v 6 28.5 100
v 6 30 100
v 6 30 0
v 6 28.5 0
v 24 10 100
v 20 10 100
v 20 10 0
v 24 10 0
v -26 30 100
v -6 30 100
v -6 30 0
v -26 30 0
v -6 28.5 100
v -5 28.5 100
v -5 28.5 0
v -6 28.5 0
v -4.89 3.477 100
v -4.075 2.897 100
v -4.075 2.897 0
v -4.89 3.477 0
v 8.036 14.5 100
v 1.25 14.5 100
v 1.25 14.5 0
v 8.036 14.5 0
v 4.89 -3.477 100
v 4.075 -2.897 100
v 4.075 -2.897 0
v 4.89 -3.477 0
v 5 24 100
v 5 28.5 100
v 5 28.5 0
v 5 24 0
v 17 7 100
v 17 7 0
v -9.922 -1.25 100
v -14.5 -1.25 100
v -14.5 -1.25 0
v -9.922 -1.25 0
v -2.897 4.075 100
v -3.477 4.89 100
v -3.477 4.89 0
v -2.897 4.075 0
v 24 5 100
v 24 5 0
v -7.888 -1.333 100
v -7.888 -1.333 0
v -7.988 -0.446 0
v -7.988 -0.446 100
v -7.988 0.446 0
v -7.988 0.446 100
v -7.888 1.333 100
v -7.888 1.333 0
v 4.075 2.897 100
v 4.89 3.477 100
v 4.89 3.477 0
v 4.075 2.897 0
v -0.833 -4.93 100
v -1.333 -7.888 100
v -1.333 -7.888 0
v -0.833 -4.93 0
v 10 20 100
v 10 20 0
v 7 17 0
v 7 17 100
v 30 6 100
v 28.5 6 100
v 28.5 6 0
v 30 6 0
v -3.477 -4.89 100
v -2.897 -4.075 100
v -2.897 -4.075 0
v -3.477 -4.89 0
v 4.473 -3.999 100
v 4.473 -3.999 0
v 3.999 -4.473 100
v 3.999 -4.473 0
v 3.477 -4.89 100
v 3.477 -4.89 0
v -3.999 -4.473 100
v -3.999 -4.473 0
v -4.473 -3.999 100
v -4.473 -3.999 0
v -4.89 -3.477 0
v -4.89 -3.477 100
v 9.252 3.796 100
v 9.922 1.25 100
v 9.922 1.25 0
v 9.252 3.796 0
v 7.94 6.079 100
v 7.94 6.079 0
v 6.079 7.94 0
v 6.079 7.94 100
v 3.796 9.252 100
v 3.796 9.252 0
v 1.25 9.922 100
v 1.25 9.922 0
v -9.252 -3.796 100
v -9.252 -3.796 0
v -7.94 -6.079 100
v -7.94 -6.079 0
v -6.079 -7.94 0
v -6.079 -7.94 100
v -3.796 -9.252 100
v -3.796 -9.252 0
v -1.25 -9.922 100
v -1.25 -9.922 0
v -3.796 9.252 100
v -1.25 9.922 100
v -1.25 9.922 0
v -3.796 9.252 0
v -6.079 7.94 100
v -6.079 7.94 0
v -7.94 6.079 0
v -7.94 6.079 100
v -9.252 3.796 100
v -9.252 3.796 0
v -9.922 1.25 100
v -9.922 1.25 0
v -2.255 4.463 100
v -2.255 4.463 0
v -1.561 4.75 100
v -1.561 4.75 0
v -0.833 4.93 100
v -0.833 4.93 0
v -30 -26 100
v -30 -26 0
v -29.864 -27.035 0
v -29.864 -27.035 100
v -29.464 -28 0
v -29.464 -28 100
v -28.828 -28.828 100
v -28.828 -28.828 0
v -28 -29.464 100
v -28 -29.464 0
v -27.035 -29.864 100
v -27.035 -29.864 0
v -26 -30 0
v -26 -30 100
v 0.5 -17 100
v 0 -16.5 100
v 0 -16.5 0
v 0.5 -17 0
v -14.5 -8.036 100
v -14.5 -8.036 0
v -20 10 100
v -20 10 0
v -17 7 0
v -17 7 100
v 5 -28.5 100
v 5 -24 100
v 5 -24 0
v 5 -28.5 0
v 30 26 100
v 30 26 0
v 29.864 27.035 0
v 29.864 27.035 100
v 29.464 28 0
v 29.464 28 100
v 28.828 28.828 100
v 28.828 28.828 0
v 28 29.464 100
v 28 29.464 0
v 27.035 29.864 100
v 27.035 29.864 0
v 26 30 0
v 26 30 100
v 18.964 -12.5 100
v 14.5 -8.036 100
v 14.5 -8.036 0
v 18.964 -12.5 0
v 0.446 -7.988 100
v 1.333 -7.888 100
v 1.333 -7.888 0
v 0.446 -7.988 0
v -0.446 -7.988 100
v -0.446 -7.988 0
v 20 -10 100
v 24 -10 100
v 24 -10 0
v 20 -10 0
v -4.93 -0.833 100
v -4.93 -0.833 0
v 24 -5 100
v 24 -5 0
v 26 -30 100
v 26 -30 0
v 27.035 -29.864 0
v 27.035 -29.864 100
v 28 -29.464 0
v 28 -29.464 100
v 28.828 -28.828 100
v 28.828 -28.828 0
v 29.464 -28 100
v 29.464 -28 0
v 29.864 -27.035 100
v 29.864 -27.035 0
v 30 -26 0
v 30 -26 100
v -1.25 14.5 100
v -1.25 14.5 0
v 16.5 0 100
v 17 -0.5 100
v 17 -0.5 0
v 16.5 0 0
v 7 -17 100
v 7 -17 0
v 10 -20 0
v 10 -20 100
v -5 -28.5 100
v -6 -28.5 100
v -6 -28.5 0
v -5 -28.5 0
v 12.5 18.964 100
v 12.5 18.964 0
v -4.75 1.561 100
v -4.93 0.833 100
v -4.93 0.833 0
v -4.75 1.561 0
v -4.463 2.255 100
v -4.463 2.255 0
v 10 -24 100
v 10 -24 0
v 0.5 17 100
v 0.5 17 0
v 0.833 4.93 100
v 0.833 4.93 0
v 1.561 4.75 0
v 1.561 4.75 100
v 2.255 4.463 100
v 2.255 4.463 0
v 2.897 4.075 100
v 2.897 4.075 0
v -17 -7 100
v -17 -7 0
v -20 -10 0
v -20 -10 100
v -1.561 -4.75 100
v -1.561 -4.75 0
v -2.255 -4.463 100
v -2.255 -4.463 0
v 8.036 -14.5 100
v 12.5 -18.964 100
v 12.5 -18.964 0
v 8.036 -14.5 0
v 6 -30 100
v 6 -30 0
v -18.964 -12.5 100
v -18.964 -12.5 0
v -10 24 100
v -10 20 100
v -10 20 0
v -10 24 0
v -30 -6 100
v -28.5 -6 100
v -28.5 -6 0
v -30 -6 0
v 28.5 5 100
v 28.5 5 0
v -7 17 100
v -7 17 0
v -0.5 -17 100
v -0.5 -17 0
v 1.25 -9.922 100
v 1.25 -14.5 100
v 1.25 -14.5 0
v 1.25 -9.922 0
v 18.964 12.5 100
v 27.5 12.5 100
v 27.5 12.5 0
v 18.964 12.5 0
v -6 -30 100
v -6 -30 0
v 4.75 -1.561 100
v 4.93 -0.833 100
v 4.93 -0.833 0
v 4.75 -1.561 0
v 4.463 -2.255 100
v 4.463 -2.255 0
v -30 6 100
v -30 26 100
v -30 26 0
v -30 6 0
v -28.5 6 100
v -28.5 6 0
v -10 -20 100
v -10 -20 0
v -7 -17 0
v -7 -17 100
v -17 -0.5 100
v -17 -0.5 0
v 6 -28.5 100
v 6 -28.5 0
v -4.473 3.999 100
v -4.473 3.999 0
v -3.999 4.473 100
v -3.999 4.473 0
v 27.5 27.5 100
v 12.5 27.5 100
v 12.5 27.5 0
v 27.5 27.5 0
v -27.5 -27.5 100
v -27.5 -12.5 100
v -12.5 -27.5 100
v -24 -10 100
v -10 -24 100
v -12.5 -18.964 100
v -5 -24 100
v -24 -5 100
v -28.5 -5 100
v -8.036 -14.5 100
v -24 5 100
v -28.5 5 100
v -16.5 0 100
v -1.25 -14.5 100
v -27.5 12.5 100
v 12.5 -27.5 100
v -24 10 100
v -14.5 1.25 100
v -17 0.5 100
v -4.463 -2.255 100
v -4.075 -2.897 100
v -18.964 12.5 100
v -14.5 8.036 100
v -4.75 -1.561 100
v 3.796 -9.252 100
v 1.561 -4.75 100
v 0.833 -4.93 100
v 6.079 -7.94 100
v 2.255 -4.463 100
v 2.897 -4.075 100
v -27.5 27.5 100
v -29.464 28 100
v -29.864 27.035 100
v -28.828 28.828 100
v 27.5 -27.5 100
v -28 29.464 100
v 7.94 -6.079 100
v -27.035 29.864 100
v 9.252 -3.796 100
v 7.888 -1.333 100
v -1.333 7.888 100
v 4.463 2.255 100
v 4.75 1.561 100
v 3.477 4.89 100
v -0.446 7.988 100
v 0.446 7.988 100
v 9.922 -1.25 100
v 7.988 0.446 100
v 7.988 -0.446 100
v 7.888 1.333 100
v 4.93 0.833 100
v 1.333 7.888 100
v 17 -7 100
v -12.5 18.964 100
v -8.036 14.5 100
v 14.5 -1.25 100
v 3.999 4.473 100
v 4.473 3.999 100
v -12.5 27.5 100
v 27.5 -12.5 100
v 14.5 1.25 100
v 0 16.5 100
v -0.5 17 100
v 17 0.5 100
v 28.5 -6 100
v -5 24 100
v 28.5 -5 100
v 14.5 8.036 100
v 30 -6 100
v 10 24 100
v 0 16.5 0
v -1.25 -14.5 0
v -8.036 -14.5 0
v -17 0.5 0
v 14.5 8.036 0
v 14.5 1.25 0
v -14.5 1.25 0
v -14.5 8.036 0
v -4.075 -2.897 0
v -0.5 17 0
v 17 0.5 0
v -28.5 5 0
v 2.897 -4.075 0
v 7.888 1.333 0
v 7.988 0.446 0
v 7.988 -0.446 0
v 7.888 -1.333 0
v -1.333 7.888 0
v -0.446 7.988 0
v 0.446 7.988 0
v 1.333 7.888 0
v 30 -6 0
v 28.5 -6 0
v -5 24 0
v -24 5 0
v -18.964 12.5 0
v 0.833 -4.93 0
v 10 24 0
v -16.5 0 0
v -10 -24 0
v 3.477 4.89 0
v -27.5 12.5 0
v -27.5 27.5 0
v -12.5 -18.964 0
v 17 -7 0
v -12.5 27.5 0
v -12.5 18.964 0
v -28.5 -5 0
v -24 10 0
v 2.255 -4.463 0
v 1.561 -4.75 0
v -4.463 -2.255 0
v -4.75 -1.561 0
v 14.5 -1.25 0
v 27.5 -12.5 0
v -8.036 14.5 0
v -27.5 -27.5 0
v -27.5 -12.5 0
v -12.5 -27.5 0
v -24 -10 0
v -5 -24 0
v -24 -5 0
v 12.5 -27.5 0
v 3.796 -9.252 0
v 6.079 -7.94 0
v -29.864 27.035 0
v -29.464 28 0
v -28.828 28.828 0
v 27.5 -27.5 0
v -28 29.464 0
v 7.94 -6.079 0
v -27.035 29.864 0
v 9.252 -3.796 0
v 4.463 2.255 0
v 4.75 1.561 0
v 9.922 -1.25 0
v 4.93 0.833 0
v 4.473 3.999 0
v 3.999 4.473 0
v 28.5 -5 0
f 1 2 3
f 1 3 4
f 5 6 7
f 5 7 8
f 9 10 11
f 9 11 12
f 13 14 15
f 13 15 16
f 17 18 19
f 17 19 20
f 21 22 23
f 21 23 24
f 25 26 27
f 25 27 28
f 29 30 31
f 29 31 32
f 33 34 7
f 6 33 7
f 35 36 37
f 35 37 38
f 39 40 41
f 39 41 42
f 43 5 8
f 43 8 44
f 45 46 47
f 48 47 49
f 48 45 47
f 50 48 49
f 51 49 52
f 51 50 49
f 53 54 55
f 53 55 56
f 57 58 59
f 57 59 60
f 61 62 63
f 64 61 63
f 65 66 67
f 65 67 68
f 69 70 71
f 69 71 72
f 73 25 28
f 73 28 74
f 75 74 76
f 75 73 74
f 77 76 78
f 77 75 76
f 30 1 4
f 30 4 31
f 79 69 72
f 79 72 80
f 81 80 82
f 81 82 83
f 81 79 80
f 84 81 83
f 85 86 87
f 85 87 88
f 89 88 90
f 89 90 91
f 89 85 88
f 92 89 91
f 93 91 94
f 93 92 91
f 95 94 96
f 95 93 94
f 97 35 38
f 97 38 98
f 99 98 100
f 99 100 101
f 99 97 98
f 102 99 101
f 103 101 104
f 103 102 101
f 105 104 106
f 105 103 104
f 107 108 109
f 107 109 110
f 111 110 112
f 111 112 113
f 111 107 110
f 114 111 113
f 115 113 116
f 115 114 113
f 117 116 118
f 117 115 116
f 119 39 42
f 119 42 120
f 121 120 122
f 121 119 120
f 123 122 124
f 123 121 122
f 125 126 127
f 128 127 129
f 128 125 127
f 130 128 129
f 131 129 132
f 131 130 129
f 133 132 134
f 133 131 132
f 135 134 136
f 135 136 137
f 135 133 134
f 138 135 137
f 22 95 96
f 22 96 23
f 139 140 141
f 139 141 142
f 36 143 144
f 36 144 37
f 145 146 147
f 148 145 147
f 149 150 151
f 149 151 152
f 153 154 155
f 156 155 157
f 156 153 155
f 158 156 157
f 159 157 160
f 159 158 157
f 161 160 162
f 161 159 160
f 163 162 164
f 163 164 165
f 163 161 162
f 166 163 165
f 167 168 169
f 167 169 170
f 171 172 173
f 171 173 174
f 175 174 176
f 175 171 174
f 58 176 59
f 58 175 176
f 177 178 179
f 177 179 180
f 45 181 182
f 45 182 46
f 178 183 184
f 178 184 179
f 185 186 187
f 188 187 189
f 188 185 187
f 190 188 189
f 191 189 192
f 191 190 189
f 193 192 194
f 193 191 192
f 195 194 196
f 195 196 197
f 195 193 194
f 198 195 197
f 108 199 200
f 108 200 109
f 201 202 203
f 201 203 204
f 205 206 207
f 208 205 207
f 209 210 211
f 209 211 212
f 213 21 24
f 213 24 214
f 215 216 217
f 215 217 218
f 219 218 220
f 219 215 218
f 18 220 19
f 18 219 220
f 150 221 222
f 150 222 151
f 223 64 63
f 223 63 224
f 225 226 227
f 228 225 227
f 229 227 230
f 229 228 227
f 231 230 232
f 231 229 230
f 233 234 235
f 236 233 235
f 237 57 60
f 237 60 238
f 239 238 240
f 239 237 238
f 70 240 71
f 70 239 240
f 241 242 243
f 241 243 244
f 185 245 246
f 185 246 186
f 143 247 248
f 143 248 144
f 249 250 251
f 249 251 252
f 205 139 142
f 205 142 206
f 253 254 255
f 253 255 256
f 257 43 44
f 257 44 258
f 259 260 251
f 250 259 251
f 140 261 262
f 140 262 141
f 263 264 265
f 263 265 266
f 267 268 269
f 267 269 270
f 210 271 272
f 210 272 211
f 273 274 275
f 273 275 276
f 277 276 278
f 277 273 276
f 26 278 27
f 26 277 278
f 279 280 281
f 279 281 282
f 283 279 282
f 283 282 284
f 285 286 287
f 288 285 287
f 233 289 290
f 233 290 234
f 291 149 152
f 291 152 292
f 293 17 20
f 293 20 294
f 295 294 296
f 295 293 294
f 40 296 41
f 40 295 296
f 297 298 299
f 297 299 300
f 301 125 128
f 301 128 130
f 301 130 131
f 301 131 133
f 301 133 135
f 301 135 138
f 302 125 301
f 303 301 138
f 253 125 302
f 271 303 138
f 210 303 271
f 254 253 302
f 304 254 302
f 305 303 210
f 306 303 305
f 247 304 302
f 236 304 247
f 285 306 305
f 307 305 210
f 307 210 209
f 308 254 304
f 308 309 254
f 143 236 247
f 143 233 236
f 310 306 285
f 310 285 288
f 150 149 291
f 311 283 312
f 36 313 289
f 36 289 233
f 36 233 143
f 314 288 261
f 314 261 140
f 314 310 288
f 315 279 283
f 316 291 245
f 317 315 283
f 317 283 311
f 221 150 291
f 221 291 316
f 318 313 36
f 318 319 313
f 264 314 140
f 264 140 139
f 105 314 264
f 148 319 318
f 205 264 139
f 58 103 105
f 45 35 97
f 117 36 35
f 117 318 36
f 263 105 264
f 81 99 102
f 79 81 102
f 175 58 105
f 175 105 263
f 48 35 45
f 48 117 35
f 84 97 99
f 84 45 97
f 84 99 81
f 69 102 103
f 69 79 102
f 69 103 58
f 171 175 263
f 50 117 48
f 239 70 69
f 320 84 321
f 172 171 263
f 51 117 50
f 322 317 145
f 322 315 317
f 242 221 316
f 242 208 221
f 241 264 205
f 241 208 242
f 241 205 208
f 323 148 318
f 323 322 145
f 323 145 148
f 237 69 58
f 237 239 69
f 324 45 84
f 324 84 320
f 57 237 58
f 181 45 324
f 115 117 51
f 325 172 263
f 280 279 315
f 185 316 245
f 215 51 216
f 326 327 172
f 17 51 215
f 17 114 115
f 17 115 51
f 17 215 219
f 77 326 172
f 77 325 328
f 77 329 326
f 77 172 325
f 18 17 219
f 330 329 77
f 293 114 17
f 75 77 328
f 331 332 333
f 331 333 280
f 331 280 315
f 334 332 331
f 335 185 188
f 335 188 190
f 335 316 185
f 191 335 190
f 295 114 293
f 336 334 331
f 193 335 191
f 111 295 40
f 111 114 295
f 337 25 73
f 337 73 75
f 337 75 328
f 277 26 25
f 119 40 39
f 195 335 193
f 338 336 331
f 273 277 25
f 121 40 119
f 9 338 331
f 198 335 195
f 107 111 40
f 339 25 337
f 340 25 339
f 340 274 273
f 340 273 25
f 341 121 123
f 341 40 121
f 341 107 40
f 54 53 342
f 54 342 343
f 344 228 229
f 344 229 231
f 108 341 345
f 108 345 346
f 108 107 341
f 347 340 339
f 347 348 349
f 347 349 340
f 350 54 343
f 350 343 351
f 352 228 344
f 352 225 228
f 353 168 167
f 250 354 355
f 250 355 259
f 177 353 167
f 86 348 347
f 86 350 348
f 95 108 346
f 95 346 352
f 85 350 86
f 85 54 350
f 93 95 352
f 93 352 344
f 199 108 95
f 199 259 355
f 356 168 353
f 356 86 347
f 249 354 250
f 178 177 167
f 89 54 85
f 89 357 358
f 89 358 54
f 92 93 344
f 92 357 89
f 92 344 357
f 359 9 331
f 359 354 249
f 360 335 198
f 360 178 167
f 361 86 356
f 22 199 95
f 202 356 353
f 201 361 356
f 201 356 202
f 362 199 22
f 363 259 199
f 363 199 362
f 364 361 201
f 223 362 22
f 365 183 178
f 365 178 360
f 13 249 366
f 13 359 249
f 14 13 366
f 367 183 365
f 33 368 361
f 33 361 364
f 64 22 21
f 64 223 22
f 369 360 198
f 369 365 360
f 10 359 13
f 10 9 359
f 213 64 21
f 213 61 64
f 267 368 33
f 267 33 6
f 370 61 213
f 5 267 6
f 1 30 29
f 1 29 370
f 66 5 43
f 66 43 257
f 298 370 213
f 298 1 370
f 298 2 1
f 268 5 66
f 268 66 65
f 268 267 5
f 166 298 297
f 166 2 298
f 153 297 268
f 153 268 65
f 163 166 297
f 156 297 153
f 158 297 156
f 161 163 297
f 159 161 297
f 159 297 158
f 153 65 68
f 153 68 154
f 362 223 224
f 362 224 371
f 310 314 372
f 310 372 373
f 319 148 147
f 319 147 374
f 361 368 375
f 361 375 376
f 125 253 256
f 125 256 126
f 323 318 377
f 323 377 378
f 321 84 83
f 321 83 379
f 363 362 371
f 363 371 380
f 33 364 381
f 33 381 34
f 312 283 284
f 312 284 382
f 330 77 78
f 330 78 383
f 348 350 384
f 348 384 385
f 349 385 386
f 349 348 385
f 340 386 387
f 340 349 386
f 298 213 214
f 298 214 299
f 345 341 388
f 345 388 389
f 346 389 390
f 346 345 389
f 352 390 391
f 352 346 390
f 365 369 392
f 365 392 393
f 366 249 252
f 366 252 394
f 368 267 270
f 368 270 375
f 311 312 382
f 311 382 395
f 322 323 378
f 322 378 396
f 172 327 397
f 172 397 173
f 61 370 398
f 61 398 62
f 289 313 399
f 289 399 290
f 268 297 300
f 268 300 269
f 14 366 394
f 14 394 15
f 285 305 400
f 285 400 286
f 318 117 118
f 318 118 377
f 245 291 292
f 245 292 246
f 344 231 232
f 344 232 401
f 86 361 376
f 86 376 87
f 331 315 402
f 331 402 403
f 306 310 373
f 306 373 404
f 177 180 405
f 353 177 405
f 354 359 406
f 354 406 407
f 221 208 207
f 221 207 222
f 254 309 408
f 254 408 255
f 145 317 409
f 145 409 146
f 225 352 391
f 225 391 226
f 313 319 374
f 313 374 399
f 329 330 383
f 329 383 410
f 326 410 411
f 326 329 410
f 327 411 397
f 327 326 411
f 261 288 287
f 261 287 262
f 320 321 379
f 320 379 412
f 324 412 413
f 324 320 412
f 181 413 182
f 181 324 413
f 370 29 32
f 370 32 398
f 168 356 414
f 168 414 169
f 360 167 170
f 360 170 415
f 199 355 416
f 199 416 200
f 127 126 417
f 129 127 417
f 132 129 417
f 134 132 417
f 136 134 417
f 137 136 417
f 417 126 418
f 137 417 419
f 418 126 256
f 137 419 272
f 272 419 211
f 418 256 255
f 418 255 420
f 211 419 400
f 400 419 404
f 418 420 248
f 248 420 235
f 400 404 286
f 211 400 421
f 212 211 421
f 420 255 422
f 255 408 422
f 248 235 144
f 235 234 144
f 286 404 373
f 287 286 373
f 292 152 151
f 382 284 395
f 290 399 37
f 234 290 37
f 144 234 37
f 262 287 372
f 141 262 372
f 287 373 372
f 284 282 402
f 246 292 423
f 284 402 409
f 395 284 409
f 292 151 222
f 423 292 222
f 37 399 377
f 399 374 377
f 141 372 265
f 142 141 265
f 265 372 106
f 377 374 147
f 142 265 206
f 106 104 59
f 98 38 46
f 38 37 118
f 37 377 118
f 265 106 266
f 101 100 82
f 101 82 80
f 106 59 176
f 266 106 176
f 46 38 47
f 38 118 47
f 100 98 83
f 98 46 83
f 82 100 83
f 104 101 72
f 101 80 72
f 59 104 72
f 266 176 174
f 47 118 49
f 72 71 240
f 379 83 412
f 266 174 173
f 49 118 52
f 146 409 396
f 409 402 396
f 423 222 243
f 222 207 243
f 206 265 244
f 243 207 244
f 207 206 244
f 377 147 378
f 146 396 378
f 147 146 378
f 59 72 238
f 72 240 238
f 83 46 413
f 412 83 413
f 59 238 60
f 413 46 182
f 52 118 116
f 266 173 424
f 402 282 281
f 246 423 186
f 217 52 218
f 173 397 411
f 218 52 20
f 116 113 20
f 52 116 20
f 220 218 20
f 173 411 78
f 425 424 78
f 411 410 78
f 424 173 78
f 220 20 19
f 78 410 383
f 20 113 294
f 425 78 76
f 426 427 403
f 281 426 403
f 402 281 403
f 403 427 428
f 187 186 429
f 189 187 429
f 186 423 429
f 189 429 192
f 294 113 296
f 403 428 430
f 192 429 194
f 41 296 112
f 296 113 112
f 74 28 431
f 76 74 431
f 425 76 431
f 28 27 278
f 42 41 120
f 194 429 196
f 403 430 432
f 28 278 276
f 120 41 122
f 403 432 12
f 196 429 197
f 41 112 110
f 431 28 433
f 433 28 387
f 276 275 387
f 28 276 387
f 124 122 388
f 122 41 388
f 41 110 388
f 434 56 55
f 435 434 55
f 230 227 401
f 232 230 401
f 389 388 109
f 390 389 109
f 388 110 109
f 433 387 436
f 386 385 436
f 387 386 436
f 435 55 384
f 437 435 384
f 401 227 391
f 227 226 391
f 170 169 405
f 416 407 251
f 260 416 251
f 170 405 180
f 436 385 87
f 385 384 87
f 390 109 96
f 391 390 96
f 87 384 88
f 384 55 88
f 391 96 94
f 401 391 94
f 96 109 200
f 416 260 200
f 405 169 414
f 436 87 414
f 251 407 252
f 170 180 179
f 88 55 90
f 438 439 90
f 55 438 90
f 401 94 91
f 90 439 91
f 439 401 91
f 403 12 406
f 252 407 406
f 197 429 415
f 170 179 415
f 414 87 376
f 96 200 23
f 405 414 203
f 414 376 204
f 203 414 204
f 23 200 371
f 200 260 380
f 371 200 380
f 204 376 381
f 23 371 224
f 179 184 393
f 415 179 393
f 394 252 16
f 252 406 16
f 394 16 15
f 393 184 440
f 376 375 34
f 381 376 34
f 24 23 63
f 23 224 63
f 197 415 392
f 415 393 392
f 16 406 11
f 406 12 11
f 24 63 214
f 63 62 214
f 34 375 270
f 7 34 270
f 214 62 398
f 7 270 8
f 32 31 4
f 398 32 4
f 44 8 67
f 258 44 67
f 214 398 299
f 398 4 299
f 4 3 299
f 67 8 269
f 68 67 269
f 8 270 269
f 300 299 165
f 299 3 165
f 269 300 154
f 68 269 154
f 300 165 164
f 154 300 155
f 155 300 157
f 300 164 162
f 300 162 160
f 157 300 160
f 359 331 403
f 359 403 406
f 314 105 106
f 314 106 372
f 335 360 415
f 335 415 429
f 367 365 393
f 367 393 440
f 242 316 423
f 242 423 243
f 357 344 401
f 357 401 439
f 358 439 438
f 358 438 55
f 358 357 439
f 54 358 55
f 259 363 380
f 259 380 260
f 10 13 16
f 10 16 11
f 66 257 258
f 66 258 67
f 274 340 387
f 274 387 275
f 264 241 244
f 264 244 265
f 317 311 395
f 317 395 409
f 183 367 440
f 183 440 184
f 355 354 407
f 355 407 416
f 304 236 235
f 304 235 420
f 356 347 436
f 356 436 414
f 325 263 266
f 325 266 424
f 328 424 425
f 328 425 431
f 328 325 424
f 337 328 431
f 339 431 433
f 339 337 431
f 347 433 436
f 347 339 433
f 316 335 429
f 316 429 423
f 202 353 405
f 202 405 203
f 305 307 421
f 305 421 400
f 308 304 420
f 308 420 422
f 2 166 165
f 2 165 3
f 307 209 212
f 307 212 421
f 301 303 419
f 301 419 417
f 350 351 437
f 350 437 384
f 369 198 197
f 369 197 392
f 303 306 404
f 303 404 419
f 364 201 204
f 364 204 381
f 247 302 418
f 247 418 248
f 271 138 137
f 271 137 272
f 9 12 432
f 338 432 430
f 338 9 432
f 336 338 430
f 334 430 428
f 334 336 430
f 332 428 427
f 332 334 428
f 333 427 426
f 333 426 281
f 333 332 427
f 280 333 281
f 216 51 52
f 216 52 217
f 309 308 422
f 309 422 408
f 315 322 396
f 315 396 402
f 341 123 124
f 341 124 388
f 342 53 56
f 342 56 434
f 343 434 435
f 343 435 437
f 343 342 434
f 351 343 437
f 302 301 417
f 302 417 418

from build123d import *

# Parameters (mm, degrees)
Y_KSEKLIK_EKSTR_ZYON1_DEPTH = 100


with BuildPart() as part:
    # Çizim1 → Yükseklik-Ekstrüzyon1 (new body)
    with BuildSketch(Plane.XY.offset(100)):
        with BuildLine():
            Line((6, -28.5), (6, -30))
            Line((6, -30), (26, -30))
            ThreePointArc((26, -30), (28.828427125, -28.828427125), (30, -26))
            Line((30, -26), (30, -6))
            Line((30, -6), (28.5, -6))
            Line((28.5, -6), (28.5, -5))
            Line((28.5, -5), (24, -5))
            Line((24, -5), (24, -10))
            Line((24, -10), (20, -10))
            Line((20, -10), (17, -7))
            Line((17, -7), (17, -0.5))
            Line((17, -0.5), (16.5, 0))
            Line((16.5, 0), (17, 0.5))
            Line((17, 0.5), (17, 7))
            Line((17, 7), (20, 10))
            Line((20, 10), (24, 10))
            Line((24, 10), (24, 5))
            Line((24, 5), (28.5, 5))
            Line((28.5, 5), (28.5, 6))
            Line((28.5, 6), (30, 6))
            Line((30, 6), (30, 26))
            ThreePointArc((30, 26), (28.828427125, 28.828427125), (26, 30))
            Line((26, 30), (6, 30))
            Line((6, 30), (6, 28.5))
            Line((6, 28.5), (5, 28.5))
            Line((5, 28.5), (5, 24))
            Line((5, 24), (10, 24))
            Line((10, 24), (10, 20))
            Line((10, 20), (7, 17))
            Line((7, 17), (0.5, 17))
            Line((0.5, 17), (0, 16.5))
            Line((0, 16.5), (-0.5, 17))
            Line((-0.5, 17), (-7, 17))
            Line((-7, 17), (-10, 20))
            Line((-10, 20), (-10, 24))
            Line((-10, 24), (-5, 24))
            Line((-5, 24), (-5, 28.5))
            Line((-5, 28.5), (-6, 28.5))
            Line((-6, 28.5), (-6, 30))
            Line((-6, 30), (-26, 30))
            ThreePointArc((-26, 30), (-28.828427125, 28.828427125), (-30, 26))
            Line((-30, 26), (-30, 6))
            Line((-30, 6), (-28.5, 6))
            Line((-28.5, 6), (-28.5, 5))
            Line((-28.5, 5), (-24, 5))
            Line((-24, 5), (-24, 10))
            Line((-24, 10), (-20, 10))
            Line((-20, 10), (-17, 7))
            Line((-17, 7), (-17, 0.5))
            Line((-17, 0.5), (-16.5, 0))
            Line((-16.5, 0), (-17, -0.5))
            Line((-17, -0.5), (-17, -7))
            Line((-17, -7), (-20, -10))
            Line((-20, -10), (-24, -10))
            Line((-24, -10), (-24, -5))
            Line((-24, -5), (-28.5, -5))
            Line((-28.5, -5), (-28.5, -6))
            Line((-28.5, -6), (-30, -6))
            Line((-30, -6), (-30, -26))
            ThreePointArc((-30, -26), (-28.828427125, -28.828427125), (-26, -30))
            Line((-26, -30), (-6, -30))
            Line((-6, -30), (-6, -28.5))
            Line((-6, -28.5), (-5, -28.5))
            Line((-5, -28.5), (-5, -24))
            Line((-5, -24), (-10, -24))
            Line((-10, -24), (-10, -20))
            Line((-10, -20), (-7, -17))
            Line((-7, -17), (-0.5, -17))
            Line((-0.5, -17), (0, -16.5))
            Line((0, -16.5), (0.5, -17))
            Line((0.5, -17), (7, -17))
            Line((7, -17), (10, -20))
            Line((10, -20), (10, -24))
            Line((10, -24), (5, -24))
            Line((5, -24), (5, -28.5))
            Line((5, -28.5), (6, -28.5))
        make_face()
        with BuildLine():
            Line((0.832983278, -4.930125652), (1.332773242, -7.88820103))
            ThreePointArc((1.332773242, -7.88820103), (1e-09, -8), (-1.33277324, -7.88820103))
            Line((-1.33277324, -7.88820103), (-0.832983276, -4.930125653))
            ThreePointArc((-0.832983276, -4.930125653), (-1.913417159, -4.619397673), (-2.897117147, -4.075133412))
            Line((-2.897117147, -4.075133412), (-3.476540579, -4.890160098))
            ThreePointArc((-3.476540579, -4.890160098), (-4.242640692, -4.242640704), (-4.890160088, -3.476540593))
            Line((-4.890160088, -3.476540593), (-4.075133404, -2.897117158))
            ThreePointArc((-4.075133404, -2.897117158), (-4.619397678, -1.913417147), (-4.930125659, -0.832983237))
            Line((-4.930125659, -0.832983237), (-7.888201041, -1.332773176))
            ThreePointArc((-7.888201041, -1.332773176), (-8, 3.5e-08), (-7.888201029, 1.332773245))
            Line((-7.888201029, 1.332773245), (-4.930125652, 0.83298328))
            ThreePointArc((-4.930125652, 0.83298328), (-4.619397673, 1.913417161), (-4.075133412, 2.897117148))
            Line((-4.075133412, 2.897117148), (-4.890160097, 3.47654058))
            ThreePointArc((-4.890160097, 3.47654058), (-4.242640703, 4.242640692), (-3.476540592, 4.890160089))
            Line((-3.476540592, 4.890160089), (-2.897117158, 4.075133404))
            ThreePointArc((-2.897117158, 4.075133404), (-1.913417166, 4.619397671), (-0.832983278, 4.930125652))
            Line((-0.832983278, 4.930125652), (-1.332773242, 7.88820103))
            ThreePointArc((-1.332773242, 7.88820103), (-1e-09, 8), (1.33277324, 7.88820103))
            Line((1.33277324, 7.88820103), (0.832983276, 4.930125653))
            ThreePointArc((0.832983276, 4.930125653), (1.913417166, 4.619397671), (2.897117158, 4.075133404))
            Line((2.897117158, 4.075133404), (3.476540592, 4.890160088))
            ThreePointArc((3.476540592, 4.890160088), (4.242640703, 4.242640692), (4.890160098, 3.476540579))
            Line((4.890160098, 3.476540579), (4.075133412, 2.897117147))
            ThreePointArc((4.075133412, 2.897117147), (4.619397681, 1.913417141), (4.930125659, 0.832983237))
            Line((4.930125659, 0.832983237), (7.888201041, 1.332773176))
            ThreePointArc((7.888201041, 1.332773176), (8, -3.5e-08), (7.88820103, -1.332773245))
            Line((7.88820103, -1.332773245), (4.930125652, -0.83298328))
            ThreePointArc((4.930125652, -0.83298328), (4.61939767, -1.913417167), (4.075133404, -2.897117159))
            Line((4.075133404, -2.897117159), (4.890160088, -3.476540593))
            ThreePointArc((4.890160088, -3.476540593), (4.242640698, -4.242640697), (3.476540594, -4.890160088))
            Line((3.476540594, -4.890160088), (2.897117159, -4.075133403))
            ThreePointArc((2.897117159, -4.075133403), (1.913417167, -4.61939767), (0.832983278, -4.930125652))
        make_face(mode=Mode.SUBTRACT)
        with BuildLine():
            Line((12.5, 18.964466094), (12.5, 27.5))
            Line((12.5, 27.5), (27.5, 27.5))
            Line((27.5, 27.5), (27.5, 12.5))
            Line((27.5, 12.5), (18.964466094, 12.5))
            Line((18.964466094, 12.5), (14.5, 8.035533906))
            Line((14.5, 8.035533906), (14.5, 1.250000001))
            Line((14.5, 1.250000001), (9.921567416, 1.250000001))
            ThreePointArc((9.921567416, 1.250000001), (7.071067812, 7.071067812), (1.250000001, 9.921567416))
            Line((1.250000001, 9.921567416), (1.250000001, 14.5))
            Line((1.250000001, 14.5), (8.035533906, 14.5))
            Line((8.035533906, 14.5), (12.5, 18.964466094))
        make_face(mode=Mode.SUBTRACT)
        with BuildLine():
            Line((18.964466094, -12.5), (27.5, -12.5))
            Line((27.5, -12.5), (27.5, -27.5))
            Line((27.5, -27.5), (12.5, -27.5))
            Line((12.5, -27.5), (12.5, -18.964466094))
            Line((12.5, -18.964466094), (8.035533906, -14.5))
            Line((8.035533906, -14.5), (1.250000001, -14.5))
            Line((1.250000001, -14.5), (1.250000001, -9.921567416))
            ThreePointArc((1.250000001, -9.921567416), (7.071067812, -7.071067812), (9.921567416, -1.250000001))
            Line((9.921567416, -1.250000001), (14.5, -1.250000001))
            Line((14.5, -1.250000001), (14.5, -8.035533906))
            Line((14.5, -8.035533906), (18.964466094, -12.5))
        make_face(mode=Mode.SUBTRACT)
        with BuildLine():
            Line((-12.5, -18.964466094), (-12.5, -27.5))
            Line((-12.5, -27.5), (-27.5, -27.5))
            Line((-27.5, -27.5), (-27.5, -12.5))
            Line((-27.5, -12.5), (-18.964466094, -12.5))
            Line((-18.964466094, -12.5), (-14.5, -8.035533906))
            Line((-14.5, -8.035533906), (-14.5, -1.250000001))
            Line((-14.5, -1.250000001), (-9.921567416, -1.250000001))
            ThreePointArc((-9.921567416, -1.250000001), (-7.071067812, -7.071067812), (-1.250000001, -9.921567416))
            Line((-1.250000001, -9.921567416), (-1.250000001, -14.5))
            Line((-1.250000001, -14.5), (-8.035533906, -14.5))
            Line((-8.035533906, -14.5), (-12.5, -18.964466094))
        make_face(mode=Mode.SUBTRACT)
        with BuildLine():
            Line((-18.964466094, 12.5), (-27.5, 12.5))
            Line((-27.5, 12.5), (-27.5, 27.5))
            Line((-27.5, 27.5), (-12.5, 27.5))
            Line((-12.5, 27.5), (-12.5, 18.964466094))
            Line((-12.5, 18.964466094), (-8.035533906, 14.5))
            Line((-8.035533906, 14.5), (-1.250000001, 14.5))
            Line((-1.250000001, 14.5), (-1.250000001, 9.921567416))
            ThreePointArc((-1.250000001, 9.921567416), (-7.071067812, 7.071067812), (-9.921567416, 1.250000001))
            Line((-9.921567416, 1.250000001), (-14.5, 1.250000001))
            Line((-14.5, 1.250000001), (-14.5, 8.035533906))
            Line((-14.5, 8.035533906), (-18.964466094, 12.5))
        make_face(mode=Mode.SUBTRACT)
    extrude(amount=-Y_KSEKLIK_EKSTR_ZYON1_DEPTH)


solid = part.part
